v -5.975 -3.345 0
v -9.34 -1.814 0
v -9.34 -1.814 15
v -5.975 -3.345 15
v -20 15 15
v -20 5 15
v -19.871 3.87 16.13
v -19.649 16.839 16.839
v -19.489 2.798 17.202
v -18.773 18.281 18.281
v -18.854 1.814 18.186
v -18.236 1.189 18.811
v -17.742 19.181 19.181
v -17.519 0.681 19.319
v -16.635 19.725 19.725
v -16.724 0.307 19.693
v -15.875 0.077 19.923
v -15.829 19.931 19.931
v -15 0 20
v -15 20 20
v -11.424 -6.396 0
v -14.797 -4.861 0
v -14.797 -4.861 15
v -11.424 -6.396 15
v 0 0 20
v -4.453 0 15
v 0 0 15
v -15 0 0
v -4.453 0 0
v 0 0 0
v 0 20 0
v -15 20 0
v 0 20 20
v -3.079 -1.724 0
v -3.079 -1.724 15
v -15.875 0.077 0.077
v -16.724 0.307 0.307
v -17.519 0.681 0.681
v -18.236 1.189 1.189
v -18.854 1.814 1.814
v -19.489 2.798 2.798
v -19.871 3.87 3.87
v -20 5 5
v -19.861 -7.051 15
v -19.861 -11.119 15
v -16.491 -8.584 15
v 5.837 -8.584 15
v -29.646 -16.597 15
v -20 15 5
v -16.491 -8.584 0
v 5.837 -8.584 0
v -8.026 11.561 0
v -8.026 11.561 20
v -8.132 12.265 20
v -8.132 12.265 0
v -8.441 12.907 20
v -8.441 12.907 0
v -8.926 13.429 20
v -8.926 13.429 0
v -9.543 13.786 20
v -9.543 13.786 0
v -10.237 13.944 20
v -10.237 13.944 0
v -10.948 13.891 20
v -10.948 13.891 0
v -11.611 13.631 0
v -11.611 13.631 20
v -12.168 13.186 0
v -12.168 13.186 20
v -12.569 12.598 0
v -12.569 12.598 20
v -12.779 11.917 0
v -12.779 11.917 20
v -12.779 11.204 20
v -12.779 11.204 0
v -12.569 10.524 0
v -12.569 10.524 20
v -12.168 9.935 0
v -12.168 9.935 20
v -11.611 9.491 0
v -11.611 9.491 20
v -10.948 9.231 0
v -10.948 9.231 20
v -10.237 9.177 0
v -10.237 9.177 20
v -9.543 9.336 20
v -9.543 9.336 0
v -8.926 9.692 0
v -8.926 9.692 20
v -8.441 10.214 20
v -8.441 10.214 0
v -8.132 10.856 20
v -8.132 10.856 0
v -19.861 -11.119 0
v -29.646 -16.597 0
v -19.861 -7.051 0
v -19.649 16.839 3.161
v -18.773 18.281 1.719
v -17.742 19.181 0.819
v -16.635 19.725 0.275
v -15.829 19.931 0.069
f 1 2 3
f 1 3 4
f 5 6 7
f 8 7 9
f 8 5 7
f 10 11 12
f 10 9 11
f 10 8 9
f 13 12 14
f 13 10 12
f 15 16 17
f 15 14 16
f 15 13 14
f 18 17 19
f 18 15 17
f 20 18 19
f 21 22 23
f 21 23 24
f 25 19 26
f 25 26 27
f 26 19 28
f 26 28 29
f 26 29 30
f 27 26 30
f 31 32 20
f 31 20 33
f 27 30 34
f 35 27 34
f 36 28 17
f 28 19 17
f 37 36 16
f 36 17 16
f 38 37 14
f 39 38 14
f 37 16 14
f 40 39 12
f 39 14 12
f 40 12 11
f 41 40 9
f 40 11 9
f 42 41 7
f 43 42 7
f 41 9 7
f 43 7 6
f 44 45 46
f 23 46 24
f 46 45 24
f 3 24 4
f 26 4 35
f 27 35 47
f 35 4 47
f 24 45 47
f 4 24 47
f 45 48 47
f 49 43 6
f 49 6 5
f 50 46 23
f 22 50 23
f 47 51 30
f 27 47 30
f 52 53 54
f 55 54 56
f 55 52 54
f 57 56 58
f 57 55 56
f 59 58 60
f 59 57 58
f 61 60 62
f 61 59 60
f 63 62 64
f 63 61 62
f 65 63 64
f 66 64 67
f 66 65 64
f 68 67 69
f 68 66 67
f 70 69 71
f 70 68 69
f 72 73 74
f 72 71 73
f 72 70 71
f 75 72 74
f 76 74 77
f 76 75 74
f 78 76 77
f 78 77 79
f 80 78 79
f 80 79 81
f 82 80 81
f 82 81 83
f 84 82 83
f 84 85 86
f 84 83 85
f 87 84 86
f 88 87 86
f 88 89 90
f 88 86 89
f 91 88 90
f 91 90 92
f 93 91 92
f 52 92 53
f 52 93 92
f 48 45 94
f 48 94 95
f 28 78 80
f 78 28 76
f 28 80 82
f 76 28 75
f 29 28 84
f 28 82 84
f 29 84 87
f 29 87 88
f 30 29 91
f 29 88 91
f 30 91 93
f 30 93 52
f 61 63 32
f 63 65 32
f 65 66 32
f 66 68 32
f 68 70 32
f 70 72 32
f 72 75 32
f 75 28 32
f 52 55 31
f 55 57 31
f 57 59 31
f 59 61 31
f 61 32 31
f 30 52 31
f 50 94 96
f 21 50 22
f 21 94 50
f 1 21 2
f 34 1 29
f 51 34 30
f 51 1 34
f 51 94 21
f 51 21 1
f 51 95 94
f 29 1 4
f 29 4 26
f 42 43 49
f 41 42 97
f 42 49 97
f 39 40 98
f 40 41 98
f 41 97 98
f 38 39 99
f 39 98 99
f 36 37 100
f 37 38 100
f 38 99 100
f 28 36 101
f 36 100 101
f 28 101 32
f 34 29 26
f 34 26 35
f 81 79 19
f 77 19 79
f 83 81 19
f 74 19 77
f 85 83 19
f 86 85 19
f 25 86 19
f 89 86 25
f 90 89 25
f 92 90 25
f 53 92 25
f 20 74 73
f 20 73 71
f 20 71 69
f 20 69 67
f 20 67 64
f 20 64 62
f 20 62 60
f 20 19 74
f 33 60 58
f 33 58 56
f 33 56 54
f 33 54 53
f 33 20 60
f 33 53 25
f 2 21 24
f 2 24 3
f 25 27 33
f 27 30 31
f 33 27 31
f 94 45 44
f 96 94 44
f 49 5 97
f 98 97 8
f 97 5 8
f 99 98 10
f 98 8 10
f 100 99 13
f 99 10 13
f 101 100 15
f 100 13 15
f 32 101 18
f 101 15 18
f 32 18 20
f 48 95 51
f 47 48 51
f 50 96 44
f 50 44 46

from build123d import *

# Parameters (mm, degrees)
F1_DEPTH = 15
F2_W     = 20
F2_H     = 20
F3_DEPTH = 20
F4_R     = 2.390041
F5_DEPTH = 25
F7_DEPTH = 15
F8_R     = 5


with BuildPart() as f1:
    # F0 (on Top) → F1 (new body)
    with BuildSketch(Plane.XY):
        Polygon((5.837341, -8.584324), (0, 0), (-29.645713, -16.597021), align=None)
    extrude(amount=F1_DEPTH)



with BuildPart() as f3:
    # F2 (on Top) → F3 (new body)
    with BuildSketch(Plane.XY):
        with Locations((-10, 10)):
            Rectangle(F2_W, F2_H)
    extrude(amount=F3_DEPTH)

    # F4 (on Top) → F5 (cut)
    with BuildSketch(Plane.XY):
        with Locations((-10.416062, 11.560683)):
            Circle(F4_R)
    extrude(amount=F5_DEPTH, mode=Mode.SUBTRACT)


with BuildPart() as f1_1:
    add(f1.part)

    add(f3.part)  # F7 merges F3
    # F6 (on face) → F7 (join)
    with BuildSketch(Plane(origin=(0, 0, 0), x_dir=(1, 0, 0), z_dir=(0, 0, -1))):
        Polygon((-5.97543, 3.345318), (-4.453079, 0), (-3.078552, 1.723514), align=None)
        Polygon((-9.339554, 1.814409), (-5.97543, 3.345318), (-11.424466, 6.395937), align=None)
        Polygon((-14.796732, 4.861322), (-11.424466, 6.395937), (-19.861381, 11.119306), (-19.861381, 7.050547), (-16.490955, 8.584324), align=None)
    extrude(amount=-F7_DEPTH)

    # F8
    f8_edges = [f1_1.edges().sort_by_distance(p)[0] for p in [
        (-20, 20, 10),
        (-20, 0, 10),
        (-20, 10, 0),
        (-20, 10, 20),
    ]]
    fillet(f8_edges, radius=F8_R)


solid = f1_1.part
